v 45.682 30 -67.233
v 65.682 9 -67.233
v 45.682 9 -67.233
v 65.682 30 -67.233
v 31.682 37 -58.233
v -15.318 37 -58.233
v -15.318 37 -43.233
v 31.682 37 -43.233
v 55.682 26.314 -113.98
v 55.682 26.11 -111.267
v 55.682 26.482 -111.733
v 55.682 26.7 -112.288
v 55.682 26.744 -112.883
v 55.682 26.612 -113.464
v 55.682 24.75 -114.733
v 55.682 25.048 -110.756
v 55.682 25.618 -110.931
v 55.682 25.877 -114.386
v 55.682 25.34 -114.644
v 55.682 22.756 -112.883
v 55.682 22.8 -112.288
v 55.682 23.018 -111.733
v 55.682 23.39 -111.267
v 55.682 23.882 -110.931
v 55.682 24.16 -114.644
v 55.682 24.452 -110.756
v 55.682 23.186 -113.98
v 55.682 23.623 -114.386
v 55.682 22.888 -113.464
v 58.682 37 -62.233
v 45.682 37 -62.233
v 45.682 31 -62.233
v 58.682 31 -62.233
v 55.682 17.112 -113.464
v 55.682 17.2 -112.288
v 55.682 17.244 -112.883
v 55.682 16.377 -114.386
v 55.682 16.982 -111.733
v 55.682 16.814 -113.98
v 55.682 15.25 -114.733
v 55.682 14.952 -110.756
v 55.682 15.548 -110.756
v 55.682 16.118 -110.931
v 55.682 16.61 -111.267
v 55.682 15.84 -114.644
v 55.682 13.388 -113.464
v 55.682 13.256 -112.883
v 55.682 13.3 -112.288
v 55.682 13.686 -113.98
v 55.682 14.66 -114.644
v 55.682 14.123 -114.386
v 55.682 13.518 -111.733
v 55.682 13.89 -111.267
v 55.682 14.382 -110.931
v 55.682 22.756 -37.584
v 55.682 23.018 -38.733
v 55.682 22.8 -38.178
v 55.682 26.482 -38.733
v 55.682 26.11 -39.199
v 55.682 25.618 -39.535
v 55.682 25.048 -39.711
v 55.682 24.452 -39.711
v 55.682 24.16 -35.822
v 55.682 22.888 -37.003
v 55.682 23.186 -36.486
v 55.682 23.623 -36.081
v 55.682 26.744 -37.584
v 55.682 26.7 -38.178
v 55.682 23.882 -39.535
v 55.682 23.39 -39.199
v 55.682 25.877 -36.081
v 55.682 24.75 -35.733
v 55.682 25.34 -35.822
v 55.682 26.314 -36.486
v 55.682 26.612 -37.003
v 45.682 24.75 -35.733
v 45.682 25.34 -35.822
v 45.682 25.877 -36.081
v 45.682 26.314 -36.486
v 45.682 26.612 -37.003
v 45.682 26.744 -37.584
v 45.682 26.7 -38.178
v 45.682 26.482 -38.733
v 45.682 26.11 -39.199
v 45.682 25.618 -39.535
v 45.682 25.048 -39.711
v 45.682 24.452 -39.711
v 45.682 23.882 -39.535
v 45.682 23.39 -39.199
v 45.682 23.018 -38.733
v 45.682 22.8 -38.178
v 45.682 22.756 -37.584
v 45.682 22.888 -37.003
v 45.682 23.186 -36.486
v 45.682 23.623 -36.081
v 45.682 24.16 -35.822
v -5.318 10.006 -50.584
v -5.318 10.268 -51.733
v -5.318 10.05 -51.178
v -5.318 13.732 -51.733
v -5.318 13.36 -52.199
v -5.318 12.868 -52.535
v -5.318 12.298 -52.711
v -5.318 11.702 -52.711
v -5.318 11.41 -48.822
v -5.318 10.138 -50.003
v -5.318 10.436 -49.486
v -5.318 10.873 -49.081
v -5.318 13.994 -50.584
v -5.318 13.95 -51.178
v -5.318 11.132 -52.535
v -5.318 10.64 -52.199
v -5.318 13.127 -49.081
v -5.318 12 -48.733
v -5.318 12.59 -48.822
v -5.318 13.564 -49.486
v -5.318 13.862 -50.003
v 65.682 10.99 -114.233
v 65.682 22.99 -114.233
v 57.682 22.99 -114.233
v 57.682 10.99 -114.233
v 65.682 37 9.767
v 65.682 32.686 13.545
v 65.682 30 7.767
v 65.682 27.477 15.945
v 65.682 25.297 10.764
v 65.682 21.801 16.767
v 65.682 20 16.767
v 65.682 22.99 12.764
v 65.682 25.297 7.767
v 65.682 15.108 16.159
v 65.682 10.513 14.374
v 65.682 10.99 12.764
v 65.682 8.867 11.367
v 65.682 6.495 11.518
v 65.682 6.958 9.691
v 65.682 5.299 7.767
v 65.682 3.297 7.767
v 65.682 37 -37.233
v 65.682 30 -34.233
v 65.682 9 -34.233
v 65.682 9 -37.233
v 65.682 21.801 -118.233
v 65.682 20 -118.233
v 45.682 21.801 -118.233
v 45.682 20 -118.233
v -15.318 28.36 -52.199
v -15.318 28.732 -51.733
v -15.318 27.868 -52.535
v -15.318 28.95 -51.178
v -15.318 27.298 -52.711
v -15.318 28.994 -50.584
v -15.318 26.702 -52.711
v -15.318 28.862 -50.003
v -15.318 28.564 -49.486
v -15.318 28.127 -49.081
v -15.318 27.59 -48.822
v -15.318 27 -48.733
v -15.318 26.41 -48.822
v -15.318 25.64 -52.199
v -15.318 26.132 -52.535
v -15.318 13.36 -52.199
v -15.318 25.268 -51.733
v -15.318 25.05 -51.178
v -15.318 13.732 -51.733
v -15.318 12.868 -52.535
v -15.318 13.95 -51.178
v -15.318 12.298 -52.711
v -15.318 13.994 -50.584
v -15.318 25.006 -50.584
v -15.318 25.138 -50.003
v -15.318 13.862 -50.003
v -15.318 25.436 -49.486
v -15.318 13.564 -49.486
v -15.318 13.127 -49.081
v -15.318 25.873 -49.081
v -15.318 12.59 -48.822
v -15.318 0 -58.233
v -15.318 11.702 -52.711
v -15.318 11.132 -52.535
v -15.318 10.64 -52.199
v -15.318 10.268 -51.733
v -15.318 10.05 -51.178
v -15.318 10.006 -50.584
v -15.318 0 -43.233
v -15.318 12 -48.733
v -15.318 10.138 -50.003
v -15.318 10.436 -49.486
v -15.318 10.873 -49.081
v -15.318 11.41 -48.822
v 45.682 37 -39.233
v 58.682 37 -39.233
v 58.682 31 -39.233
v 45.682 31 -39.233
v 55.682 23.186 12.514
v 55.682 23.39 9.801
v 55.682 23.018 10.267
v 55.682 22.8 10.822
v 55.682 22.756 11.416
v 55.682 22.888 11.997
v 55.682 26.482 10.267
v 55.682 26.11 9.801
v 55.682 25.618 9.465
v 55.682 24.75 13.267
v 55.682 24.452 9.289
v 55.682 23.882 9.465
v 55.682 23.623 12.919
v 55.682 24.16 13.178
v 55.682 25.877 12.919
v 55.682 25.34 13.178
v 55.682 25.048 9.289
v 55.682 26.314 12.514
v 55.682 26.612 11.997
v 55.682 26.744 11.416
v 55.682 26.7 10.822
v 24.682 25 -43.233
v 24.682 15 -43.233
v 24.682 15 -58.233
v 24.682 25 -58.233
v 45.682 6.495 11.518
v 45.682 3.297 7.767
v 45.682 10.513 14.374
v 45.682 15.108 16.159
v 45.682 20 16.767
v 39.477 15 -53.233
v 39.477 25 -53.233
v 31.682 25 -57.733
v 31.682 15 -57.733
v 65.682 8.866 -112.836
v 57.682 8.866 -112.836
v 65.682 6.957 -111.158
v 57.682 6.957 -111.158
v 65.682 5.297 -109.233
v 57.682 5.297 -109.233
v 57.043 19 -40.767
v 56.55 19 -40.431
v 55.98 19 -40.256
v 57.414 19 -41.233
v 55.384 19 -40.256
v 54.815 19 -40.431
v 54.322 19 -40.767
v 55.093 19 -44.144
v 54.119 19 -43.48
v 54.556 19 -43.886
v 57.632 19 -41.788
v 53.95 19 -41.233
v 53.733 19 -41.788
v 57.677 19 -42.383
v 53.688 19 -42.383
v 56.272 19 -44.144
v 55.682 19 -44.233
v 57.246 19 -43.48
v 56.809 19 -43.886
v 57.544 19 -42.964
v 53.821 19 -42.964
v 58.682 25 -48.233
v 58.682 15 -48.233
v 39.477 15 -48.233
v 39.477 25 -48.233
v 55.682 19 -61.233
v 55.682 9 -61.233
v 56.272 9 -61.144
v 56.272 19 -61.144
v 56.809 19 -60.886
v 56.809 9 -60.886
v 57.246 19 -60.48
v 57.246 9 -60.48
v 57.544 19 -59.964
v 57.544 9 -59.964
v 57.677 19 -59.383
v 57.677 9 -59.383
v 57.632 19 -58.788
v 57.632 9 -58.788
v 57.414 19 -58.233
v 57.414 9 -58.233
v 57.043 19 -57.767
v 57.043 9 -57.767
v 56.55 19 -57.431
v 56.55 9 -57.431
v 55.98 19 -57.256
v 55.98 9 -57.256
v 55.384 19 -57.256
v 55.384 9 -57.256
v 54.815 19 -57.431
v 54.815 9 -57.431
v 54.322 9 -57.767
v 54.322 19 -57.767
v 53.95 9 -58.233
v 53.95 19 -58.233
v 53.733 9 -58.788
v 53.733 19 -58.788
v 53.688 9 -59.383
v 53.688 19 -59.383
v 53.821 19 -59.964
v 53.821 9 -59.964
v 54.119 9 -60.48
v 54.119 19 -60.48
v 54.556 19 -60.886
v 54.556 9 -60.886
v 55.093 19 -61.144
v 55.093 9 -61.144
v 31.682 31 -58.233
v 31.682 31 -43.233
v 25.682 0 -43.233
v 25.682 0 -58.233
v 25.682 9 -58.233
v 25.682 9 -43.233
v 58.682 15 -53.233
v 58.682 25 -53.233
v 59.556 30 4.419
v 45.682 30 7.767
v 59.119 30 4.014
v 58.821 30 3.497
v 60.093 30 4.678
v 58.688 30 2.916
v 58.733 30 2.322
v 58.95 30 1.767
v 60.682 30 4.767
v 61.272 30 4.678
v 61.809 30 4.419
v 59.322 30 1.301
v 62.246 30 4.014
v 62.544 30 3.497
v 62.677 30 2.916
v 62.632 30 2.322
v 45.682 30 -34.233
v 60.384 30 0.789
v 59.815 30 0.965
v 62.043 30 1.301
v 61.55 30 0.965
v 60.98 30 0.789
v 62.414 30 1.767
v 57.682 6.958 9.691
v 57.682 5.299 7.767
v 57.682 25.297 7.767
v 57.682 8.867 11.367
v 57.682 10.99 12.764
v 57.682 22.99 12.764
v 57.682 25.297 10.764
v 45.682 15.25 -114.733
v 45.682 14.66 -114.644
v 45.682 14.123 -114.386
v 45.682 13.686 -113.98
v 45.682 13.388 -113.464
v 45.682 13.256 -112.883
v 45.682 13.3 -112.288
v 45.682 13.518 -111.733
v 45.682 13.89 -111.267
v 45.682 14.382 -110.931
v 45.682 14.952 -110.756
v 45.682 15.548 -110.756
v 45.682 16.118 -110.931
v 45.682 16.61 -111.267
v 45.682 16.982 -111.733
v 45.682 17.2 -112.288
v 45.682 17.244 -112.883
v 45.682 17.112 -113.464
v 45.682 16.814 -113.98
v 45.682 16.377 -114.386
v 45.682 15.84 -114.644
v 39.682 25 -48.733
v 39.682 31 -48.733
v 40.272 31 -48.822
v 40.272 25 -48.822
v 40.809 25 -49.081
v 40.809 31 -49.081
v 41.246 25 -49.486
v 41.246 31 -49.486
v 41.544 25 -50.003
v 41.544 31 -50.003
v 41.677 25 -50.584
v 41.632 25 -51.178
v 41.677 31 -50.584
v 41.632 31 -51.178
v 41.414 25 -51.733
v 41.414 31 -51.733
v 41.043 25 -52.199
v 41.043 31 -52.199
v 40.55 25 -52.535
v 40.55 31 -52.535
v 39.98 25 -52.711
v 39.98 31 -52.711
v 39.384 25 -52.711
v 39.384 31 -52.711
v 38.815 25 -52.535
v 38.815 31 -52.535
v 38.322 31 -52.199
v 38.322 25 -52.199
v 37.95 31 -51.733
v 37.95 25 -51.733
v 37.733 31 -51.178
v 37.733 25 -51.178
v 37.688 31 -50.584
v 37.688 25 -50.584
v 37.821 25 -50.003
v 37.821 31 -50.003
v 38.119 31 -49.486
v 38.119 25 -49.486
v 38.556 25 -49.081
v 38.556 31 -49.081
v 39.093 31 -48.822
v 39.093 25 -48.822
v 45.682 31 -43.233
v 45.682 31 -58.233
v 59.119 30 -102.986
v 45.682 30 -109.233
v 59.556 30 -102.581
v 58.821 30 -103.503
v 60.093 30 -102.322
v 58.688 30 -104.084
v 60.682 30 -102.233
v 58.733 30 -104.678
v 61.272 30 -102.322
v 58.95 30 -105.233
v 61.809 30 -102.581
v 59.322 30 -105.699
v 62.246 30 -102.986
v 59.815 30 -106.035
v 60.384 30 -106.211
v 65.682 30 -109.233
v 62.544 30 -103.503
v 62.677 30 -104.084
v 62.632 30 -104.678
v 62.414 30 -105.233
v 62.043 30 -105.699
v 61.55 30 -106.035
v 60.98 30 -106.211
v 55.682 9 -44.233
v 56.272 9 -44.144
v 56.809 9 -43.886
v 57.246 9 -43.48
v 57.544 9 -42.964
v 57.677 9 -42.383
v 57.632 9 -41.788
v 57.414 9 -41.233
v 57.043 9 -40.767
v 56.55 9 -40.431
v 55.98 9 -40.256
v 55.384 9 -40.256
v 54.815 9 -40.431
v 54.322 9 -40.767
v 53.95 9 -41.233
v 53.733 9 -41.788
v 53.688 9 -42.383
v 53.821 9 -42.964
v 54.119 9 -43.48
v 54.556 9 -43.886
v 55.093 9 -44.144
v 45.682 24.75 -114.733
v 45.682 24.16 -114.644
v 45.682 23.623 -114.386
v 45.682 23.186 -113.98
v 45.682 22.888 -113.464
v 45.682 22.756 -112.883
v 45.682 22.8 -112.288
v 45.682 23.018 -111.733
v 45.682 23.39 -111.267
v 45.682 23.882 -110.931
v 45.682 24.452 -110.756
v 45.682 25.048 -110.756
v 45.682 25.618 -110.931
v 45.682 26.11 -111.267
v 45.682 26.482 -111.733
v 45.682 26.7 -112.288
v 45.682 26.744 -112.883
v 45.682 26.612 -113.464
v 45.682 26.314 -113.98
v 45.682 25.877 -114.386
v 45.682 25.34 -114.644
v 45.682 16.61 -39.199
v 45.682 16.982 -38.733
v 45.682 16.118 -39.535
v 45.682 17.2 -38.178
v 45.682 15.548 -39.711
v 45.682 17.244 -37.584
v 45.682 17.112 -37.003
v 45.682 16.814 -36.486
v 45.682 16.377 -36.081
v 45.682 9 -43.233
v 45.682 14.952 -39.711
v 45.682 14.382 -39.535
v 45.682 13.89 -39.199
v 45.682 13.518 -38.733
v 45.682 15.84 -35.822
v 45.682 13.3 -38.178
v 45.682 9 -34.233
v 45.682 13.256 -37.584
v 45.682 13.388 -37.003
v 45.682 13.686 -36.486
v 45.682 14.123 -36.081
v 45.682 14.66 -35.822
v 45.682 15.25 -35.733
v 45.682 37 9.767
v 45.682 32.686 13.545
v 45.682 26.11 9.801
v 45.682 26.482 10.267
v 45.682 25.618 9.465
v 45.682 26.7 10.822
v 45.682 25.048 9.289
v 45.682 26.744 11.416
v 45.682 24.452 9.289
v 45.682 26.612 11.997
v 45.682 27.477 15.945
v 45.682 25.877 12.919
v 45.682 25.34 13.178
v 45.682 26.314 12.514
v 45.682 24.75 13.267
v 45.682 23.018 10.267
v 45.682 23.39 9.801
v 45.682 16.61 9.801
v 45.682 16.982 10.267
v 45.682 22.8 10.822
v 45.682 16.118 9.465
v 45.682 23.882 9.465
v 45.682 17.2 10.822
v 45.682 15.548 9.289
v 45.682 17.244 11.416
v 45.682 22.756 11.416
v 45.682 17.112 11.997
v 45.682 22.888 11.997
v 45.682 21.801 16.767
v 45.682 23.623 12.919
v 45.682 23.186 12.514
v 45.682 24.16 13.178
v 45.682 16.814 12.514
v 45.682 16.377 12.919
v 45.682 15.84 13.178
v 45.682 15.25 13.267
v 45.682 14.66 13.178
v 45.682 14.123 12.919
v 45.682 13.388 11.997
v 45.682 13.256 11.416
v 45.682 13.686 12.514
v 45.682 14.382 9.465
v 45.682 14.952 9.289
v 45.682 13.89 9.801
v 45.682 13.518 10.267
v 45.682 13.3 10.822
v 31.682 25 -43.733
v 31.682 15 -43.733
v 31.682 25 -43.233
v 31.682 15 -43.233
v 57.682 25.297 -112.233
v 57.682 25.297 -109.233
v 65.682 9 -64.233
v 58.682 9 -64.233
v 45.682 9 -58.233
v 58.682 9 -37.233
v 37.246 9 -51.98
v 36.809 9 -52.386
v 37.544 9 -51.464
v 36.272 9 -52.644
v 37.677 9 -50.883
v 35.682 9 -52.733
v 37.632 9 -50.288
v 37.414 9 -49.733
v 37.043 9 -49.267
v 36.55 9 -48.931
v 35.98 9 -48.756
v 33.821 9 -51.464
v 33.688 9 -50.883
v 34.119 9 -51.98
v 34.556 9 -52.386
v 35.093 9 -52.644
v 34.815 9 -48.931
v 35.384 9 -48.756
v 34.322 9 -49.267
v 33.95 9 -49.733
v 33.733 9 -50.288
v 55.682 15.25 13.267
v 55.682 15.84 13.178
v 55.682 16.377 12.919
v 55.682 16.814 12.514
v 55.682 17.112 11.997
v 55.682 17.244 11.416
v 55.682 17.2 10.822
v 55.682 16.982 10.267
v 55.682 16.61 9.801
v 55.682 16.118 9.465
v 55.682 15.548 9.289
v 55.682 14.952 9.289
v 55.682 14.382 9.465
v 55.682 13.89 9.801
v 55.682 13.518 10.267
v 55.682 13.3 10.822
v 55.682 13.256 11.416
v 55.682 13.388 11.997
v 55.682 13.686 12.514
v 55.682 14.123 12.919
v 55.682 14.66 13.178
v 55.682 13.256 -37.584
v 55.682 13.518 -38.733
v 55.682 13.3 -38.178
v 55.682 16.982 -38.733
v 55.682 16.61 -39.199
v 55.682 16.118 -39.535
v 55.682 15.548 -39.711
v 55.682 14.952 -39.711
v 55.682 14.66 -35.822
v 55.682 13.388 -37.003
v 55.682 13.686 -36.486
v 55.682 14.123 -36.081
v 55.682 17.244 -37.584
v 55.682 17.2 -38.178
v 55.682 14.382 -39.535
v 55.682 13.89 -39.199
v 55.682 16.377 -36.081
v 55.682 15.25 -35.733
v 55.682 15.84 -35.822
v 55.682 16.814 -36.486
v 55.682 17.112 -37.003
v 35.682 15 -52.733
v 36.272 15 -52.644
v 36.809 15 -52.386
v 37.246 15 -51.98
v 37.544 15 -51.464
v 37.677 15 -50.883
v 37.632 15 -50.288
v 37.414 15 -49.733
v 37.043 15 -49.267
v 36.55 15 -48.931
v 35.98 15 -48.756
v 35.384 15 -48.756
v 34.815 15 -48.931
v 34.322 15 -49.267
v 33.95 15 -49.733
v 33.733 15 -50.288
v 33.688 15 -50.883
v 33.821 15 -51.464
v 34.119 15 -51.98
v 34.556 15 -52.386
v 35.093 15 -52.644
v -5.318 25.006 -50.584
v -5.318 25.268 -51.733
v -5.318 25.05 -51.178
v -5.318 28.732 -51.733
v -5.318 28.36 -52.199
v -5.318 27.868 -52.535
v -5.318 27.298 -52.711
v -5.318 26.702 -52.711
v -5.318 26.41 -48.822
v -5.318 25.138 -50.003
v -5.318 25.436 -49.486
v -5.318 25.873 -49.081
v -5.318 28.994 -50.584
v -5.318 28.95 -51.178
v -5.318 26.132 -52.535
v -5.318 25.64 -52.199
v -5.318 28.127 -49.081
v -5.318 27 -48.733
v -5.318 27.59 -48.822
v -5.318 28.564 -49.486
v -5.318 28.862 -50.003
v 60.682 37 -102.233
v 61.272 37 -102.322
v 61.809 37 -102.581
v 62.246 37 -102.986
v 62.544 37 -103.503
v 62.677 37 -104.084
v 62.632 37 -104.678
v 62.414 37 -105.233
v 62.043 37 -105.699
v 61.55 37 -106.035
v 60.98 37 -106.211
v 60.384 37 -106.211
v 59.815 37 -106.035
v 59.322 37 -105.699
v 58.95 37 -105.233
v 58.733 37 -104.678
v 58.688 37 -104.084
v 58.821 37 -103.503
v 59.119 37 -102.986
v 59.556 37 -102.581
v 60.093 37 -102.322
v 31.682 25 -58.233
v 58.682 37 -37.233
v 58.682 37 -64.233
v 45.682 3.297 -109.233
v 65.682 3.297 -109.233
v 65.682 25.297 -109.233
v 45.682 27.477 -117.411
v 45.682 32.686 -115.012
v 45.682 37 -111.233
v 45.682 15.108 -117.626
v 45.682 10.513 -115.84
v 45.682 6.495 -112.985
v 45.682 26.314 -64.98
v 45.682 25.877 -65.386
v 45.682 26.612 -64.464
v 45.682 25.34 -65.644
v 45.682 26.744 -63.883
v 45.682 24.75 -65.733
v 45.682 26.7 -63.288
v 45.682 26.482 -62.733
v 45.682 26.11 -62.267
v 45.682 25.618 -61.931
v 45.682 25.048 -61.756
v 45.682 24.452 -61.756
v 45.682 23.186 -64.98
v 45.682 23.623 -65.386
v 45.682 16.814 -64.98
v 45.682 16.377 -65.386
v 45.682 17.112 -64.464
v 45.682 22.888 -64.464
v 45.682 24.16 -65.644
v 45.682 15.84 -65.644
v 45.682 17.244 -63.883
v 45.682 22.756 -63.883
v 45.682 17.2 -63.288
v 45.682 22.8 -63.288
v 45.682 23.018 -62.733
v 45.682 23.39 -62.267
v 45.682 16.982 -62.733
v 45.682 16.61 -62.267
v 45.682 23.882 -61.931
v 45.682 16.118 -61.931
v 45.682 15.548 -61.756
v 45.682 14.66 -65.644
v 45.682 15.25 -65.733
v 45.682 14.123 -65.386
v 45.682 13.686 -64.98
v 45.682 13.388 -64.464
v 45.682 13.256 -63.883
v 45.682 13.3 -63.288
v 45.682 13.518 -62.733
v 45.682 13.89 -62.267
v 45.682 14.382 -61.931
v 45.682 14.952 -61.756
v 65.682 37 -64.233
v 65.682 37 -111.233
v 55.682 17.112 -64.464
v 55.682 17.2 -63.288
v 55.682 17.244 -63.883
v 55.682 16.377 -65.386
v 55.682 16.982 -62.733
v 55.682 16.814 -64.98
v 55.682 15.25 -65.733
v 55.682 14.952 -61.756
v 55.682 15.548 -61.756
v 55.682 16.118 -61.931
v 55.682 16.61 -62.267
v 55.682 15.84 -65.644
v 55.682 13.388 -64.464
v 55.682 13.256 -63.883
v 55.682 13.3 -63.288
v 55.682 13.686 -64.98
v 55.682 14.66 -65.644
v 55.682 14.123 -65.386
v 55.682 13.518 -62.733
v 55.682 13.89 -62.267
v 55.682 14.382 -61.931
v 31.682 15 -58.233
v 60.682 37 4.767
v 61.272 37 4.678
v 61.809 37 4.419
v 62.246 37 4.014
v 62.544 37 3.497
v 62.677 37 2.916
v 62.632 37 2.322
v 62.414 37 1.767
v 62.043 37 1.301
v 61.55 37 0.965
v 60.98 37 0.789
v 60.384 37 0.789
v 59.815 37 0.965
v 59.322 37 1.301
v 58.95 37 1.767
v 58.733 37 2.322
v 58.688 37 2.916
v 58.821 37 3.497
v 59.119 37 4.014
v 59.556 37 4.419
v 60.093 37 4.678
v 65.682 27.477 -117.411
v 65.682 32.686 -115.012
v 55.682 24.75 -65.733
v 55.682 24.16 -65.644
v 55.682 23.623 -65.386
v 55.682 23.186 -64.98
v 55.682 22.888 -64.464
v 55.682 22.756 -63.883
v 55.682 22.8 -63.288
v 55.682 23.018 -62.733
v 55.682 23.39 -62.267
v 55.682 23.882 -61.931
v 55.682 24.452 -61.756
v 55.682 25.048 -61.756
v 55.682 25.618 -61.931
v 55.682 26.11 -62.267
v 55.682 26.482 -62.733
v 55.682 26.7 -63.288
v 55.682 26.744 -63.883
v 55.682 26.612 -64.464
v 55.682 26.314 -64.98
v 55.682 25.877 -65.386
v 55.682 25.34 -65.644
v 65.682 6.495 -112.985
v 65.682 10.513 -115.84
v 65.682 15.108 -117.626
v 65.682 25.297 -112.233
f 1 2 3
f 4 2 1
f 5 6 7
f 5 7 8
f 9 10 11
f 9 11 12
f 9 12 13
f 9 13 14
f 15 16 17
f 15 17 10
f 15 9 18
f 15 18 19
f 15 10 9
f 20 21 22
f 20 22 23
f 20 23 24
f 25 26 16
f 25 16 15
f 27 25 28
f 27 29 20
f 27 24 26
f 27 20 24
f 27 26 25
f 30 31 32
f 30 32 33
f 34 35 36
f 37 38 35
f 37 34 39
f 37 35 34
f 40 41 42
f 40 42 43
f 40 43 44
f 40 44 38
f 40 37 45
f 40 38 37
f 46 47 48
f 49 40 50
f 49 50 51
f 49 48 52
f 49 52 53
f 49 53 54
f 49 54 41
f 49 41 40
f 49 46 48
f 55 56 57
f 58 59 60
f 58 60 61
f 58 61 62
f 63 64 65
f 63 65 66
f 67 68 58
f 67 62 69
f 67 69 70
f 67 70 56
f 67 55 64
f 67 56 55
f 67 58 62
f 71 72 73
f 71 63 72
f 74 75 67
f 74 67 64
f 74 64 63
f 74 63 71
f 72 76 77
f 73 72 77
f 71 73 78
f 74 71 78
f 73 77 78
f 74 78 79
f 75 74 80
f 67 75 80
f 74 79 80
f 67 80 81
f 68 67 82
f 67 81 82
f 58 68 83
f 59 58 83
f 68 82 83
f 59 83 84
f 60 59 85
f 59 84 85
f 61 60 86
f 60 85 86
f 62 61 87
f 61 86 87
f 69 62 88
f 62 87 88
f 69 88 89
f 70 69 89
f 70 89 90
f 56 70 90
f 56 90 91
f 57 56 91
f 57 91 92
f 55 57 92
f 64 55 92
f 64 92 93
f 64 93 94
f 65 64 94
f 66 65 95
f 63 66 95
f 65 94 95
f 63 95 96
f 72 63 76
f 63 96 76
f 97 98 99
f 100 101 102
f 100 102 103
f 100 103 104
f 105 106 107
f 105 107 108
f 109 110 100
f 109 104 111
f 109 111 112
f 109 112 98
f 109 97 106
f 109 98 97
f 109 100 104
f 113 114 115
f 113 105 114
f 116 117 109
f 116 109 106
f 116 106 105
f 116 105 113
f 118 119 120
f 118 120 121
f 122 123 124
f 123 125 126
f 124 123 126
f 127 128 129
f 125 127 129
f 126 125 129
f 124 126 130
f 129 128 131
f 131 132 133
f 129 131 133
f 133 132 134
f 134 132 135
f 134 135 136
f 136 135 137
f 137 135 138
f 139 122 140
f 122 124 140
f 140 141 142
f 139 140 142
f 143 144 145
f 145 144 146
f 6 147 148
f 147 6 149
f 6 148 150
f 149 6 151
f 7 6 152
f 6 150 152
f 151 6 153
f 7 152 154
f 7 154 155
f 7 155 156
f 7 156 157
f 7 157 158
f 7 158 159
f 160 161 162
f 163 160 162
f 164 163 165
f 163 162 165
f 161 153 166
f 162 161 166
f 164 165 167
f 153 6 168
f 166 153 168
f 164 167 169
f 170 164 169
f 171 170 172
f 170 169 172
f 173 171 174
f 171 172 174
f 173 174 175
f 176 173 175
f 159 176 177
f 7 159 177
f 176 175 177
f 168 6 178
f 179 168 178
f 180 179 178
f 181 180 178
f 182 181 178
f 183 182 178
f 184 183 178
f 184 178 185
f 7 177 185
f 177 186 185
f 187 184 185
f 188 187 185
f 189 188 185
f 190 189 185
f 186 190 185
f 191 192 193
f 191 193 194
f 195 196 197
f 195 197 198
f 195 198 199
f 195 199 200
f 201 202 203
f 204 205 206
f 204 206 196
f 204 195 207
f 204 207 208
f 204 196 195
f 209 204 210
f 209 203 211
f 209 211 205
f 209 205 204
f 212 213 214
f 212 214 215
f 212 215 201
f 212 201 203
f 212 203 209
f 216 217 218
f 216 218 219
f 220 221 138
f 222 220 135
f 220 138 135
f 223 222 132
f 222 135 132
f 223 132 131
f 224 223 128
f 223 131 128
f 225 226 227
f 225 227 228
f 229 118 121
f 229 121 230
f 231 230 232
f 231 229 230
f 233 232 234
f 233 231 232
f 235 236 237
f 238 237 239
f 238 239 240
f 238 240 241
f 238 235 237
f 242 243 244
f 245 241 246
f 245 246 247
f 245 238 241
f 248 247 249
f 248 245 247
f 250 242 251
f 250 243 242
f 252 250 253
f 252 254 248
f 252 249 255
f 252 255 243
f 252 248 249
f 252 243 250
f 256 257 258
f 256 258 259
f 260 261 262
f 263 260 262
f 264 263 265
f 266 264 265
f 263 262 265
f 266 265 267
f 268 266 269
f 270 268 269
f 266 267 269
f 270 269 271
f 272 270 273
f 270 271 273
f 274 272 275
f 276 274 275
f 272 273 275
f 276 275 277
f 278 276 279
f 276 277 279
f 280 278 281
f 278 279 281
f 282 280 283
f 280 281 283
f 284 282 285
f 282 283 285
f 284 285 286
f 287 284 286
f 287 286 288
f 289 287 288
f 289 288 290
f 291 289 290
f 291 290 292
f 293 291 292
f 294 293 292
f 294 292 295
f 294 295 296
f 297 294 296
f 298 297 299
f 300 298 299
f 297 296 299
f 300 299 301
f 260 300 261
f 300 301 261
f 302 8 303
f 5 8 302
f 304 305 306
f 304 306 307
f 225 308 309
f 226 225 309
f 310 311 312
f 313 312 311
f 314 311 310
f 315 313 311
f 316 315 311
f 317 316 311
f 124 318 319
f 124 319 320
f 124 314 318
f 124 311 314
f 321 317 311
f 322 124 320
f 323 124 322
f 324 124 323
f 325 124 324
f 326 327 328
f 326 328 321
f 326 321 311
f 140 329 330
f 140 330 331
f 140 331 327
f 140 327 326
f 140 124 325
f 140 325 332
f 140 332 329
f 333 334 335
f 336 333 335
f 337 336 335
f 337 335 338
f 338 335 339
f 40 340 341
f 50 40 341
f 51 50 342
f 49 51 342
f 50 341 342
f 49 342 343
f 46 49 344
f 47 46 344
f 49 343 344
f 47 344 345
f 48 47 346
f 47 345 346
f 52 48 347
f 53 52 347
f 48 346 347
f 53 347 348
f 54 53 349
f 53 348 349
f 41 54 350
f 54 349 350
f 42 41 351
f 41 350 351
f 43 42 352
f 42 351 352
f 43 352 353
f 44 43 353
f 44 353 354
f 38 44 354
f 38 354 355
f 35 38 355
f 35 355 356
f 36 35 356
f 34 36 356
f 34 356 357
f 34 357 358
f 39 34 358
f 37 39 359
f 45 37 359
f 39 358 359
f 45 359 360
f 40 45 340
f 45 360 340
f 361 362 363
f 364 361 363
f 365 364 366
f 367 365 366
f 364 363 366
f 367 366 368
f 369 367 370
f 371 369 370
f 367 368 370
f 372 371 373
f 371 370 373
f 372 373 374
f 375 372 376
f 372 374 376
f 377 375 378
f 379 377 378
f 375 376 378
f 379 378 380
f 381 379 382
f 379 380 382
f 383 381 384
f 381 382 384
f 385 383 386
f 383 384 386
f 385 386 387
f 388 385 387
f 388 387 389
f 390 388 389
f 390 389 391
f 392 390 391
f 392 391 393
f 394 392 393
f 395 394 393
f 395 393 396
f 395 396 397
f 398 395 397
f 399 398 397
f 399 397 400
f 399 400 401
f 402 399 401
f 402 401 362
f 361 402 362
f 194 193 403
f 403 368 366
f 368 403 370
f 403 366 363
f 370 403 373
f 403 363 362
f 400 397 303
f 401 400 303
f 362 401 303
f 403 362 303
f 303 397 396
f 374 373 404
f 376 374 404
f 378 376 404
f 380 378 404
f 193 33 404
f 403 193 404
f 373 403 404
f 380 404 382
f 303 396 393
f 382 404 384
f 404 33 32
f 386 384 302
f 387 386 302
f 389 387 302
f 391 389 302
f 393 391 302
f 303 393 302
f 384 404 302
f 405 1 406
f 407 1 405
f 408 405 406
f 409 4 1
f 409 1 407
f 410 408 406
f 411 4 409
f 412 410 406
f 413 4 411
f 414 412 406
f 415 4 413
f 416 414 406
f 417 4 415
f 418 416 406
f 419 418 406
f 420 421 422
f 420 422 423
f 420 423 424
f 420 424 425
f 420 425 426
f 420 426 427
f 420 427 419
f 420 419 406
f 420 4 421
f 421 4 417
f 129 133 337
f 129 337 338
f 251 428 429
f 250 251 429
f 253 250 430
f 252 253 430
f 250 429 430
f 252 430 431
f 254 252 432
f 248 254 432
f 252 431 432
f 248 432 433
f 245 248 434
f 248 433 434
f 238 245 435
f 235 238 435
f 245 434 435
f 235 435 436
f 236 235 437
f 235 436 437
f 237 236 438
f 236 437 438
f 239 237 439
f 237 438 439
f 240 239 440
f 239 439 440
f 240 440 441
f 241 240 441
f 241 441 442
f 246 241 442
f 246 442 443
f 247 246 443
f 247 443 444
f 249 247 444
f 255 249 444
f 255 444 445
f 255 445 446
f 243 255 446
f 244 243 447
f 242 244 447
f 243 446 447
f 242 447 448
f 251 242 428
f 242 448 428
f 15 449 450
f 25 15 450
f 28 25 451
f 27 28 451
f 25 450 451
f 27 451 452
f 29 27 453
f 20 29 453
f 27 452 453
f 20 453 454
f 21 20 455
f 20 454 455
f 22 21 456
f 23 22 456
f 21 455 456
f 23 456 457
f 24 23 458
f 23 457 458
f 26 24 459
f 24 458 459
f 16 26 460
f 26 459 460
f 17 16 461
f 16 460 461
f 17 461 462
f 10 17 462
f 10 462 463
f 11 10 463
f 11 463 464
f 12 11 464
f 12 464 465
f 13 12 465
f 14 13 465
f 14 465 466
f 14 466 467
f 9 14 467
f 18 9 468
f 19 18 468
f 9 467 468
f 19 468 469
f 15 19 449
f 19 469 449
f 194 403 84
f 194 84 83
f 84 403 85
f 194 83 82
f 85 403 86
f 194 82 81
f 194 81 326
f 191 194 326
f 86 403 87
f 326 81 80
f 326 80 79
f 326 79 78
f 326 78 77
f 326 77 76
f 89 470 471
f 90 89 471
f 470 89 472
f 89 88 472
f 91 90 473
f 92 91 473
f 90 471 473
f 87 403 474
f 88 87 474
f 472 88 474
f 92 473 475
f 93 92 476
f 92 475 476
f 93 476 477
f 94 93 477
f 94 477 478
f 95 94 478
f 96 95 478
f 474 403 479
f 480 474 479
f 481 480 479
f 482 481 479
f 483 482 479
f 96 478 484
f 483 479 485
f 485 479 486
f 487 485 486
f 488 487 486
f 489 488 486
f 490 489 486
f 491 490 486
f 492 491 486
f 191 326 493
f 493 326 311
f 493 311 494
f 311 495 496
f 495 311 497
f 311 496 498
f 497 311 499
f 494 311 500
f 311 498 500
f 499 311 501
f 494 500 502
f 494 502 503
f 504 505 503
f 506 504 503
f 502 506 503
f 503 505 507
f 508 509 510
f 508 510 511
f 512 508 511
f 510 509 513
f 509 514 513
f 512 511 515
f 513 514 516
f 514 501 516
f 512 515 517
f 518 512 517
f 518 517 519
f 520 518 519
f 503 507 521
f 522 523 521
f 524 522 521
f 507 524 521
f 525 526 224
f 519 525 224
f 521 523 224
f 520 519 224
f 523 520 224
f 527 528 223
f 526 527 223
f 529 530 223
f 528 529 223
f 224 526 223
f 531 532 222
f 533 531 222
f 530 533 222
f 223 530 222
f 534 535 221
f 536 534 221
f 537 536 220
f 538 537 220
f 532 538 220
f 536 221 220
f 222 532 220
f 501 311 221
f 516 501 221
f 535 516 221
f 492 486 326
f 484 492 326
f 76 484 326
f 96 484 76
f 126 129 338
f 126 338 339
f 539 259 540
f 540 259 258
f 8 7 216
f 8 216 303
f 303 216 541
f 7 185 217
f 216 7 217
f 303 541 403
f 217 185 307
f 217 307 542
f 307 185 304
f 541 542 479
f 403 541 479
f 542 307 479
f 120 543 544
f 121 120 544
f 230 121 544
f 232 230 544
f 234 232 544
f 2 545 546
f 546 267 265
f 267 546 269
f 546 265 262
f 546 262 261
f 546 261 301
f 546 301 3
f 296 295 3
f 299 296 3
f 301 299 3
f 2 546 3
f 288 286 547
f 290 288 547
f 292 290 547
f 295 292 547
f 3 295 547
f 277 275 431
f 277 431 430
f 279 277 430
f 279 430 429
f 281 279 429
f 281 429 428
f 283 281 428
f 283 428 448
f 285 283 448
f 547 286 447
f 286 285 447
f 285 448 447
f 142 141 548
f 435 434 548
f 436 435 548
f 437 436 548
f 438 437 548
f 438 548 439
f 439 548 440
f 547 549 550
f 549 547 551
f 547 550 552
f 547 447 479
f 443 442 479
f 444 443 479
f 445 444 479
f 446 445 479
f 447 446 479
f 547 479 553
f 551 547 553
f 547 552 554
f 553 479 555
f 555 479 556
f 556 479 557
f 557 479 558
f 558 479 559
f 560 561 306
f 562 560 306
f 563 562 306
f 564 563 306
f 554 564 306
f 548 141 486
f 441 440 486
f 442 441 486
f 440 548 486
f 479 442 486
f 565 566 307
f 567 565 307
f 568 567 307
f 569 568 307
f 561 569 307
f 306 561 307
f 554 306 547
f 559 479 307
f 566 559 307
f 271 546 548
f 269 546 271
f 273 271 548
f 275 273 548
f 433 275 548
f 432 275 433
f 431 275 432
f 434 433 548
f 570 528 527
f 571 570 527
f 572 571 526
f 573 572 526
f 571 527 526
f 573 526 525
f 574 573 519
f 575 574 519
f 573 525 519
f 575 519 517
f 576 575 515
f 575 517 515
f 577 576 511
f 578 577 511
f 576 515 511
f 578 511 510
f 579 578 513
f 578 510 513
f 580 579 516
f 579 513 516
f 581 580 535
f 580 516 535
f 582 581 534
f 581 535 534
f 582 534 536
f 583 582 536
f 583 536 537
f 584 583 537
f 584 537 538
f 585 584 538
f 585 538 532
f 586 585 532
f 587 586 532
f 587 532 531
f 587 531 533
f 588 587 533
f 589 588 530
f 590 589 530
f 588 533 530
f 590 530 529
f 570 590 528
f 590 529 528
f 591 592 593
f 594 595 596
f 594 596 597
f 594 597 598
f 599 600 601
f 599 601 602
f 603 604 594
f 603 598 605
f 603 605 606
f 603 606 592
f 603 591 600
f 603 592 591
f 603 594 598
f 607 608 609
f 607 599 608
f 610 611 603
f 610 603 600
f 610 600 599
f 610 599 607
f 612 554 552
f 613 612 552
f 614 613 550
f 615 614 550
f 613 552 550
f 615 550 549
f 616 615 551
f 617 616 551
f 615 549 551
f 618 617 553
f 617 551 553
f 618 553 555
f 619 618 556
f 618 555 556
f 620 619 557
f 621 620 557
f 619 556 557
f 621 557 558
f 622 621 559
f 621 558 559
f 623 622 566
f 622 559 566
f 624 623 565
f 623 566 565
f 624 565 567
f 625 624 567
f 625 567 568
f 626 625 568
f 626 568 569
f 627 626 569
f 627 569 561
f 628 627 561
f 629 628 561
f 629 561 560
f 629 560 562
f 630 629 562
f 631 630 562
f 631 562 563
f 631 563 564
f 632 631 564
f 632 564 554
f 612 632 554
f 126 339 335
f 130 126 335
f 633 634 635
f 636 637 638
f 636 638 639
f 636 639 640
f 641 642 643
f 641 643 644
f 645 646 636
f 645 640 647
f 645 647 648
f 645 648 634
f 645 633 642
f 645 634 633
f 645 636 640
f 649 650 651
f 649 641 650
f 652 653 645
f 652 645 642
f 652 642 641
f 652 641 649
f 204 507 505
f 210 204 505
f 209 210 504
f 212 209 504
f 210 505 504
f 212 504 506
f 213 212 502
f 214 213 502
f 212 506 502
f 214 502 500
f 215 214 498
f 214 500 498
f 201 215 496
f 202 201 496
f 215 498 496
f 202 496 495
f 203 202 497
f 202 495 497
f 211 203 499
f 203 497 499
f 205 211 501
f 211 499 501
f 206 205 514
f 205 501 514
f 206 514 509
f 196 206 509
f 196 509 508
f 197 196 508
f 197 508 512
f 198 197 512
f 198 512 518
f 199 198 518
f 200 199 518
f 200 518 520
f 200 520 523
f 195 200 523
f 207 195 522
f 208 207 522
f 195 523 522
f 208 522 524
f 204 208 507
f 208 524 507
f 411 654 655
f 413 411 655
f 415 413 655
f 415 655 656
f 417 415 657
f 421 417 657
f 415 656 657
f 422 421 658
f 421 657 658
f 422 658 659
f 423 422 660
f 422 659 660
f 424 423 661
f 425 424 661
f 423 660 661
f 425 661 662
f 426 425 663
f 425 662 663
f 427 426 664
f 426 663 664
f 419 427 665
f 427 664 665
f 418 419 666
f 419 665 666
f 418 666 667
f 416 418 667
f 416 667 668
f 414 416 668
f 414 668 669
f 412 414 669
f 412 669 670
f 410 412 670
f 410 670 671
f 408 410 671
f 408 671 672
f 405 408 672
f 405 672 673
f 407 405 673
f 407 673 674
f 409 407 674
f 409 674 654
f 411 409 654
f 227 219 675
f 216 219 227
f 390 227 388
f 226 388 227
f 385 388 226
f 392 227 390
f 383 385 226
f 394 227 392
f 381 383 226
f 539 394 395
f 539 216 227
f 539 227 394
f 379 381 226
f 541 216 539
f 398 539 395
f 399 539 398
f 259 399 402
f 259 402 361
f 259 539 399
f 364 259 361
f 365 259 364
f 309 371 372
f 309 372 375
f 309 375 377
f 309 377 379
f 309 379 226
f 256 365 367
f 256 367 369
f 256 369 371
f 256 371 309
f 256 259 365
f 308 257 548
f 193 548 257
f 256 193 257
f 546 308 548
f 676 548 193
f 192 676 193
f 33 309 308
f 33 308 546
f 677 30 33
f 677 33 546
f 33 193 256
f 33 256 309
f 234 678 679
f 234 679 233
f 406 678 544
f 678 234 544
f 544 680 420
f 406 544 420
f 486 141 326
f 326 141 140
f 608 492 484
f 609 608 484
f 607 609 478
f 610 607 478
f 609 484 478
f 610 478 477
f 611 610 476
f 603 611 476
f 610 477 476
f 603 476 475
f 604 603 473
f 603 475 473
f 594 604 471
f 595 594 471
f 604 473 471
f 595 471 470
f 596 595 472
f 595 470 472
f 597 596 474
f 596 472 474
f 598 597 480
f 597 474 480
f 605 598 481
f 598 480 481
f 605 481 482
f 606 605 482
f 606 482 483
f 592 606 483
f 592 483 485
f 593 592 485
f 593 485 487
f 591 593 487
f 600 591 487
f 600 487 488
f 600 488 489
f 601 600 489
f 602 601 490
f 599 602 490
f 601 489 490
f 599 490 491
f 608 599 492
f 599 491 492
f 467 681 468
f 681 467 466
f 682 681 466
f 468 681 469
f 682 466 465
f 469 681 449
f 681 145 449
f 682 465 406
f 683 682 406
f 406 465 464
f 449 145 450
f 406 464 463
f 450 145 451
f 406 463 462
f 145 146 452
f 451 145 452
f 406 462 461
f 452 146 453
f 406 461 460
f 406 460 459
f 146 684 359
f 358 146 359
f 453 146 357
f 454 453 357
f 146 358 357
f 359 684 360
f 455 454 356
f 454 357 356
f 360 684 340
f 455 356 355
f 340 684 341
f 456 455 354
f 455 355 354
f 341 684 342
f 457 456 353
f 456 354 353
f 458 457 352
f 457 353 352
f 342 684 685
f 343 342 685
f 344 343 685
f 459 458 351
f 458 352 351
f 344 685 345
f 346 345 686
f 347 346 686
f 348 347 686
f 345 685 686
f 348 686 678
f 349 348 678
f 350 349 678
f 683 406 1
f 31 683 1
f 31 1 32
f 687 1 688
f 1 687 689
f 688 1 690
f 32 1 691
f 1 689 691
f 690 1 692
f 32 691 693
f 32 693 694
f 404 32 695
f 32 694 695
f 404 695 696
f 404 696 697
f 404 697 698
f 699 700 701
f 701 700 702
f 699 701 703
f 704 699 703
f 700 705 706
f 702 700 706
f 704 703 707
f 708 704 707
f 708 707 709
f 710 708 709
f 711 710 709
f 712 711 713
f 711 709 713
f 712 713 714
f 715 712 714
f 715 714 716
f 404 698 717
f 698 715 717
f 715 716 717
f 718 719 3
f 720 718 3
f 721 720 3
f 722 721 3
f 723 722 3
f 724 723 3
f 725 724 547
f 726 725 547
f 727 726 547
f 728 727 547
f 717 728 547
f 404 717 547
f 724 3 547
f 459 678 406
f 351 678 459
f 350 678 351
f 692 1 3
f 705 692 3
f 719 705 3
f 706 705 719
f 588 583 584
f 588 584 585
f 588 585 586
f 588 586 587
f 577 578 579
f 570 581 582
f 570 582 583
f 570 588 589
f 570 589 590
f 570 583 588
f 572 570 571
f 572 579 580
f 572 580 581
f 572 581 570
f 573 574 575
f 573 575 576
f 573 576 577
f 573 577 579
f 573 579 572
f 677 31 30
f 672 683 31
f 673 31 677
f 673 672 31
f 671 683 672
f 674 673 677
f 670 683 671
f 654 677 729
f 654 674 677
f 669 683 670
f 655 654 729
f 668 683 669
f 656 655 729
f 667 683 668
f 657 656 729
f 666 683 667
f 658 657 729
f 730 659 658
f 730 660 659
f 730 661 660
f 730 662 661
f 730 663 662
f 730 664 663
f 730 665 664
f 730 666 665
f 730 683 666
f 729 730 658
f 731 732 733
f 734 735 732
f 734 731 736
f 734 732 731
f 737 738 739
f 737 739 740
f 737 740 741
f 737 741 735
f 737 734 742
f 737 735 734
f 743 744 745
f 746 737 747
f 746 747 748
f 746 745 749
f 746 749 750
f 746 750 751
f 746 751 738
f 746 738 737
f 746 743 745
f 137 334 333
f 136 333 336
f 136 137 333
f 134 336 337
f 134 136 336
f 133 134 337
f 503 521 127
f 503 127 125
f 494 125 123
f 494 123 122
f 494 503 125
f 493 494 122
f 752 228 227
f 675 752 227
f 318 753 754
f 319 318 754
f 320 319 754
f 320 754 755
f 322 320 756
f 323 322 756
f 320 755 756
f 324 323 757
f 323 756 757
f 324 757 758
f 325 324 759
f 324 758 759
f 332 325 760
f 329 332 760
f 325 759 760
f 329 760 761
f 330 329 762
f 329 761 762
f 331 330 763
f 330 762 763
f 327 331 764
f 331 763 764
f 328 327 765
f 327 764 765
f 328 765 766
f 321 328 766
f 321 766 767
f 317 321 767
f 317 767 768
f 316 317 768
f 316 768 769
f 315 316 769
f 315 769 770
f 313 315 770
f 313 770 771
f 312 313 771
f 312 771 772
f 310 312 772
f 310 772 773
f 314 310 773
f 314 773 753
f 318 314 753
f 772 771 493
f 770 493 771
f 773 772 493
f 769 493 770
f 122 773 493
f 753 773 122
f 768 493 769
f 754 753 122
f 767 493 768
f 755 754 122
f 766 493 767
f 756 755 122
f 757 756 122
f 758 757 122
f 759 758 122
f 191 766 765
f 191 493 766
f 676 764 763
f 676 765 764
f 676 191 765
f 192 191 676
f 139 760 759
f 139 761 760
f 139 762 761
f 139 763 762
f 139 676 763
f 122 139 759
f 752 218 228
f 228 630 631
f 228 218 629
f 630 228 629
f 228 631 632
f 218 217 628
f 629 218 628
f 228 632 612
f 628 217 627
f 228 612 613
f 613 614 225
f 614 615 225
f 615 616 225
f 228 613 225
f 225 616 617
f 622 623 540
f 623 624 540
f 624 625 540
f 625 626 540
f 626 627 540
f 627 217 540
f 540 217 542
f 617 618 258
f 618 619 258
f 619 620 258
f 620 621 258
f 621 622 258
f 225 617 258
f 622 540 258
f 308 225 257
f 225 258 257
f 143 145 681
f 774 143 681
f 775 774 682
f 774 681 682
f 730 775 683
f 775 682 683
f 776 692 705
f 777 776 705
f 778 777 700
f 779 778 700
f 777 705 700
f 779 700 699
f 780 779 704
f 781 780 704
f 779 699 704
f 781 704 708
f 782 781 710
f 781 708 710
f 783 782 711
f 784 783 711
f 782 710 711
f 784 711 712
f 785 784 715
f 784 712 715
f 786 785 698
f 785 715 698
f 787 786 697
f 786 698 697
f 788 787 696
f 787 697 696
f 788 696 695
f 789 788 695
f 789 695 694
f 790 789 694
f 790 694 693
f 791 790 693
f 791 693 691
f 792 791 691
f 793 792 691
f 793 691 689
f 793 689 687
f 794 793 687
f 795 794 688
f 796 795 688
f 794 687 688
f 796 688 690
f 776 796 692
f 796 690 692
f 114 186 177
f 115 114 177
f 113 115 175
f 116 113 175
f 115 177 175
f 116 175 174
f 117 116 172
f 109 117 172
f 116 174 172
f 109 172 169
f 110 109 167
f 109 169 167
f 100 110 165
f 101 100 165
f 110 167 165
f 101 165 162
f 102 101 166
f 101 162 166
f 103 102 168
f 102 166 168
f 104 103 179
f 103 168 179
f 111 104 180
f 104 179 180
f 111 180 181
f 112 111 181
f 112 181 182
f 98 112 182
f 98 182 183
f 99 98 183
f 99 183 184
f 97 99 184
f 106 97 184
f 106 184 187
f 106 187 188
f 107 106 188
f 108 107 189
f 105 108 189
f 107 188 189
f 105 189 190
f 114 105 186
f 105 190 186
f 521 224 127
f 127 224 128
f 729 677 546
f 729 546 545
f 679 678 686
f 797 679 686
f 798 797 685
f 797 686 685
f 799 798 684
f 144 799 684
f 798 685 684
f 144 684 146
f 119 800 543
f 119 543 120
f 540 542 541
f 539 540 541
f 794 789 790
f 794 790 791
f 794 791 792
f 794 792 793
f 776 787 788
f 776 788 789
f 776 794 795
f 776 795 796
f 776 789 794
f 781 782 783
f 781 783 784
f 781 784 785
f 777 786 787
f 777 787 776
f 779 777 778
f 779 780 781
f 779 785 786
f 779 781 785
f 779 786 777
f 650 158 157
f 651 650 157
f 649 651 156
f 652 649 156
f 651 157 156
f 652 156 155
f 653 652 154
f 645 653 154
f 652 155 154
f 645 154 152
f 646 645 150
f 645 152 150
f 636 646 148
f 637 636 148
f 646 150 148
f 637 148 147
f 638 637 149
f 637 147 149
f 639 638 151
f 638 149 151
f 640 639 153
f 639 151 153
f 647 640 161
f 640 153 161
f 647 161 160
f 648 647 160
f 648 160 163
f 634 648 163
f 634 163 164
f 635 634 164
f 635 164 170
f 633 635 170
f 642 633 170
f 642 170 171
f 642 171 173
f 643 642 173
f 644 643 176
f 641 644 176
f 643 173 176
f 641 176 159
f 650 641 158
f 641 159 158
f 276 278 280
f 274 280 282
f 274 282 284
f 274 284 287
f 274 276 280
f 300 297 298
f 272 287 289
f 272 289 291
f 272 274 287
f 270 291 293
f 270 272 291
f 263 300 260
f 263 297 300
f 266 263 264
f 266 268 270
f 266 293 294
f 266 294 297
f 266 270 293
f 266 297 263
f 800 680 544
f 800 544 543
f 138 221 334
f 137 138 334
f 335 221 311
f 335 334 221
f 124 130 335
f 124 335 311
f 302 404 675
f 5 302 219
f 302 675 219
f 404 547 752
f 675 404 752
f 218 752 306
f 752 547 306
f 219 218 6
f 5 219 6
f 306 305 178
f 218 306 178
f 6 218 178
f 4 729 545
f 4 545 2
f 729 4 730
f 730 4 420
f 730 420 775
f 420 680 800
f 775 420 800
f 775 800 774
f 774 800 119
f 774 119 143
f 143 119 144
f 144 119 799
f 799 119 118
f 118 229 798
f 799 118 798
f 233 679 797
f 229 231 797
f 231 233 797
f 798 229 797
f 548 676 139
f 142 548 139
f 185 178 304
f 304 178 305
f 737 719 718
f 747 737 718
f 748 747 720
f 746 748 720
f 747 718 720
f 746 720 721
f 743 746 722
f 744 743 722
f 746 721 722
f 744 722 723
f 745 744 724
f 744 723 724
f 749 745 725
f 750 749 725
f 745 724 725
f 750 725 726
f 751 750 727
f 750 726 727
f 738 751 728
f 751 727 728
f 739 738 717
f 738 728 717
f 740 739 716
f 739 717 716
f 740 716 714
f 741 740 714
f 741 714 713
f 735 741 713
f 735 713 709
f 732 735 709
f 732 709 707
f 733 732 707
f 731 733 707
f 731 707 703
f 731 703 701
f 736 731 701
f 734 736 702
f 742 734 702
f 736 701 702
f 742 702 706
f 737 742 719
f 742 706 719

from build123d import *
from OCP.BRepFilletAPI import BRepFilletAPI_MakeChamfer

# Parameters (mm, degrees)
BOSS_EXTRUDE1_DEPTH = 37
CUT_EXTRUDE1_REACH  = 150.017
SKETCH2_W           = 42
SKETCH2_H           = 21
SKETCH3_R           = 2
CUT_EXTRUDE2_DEPTH  = 10
FILLET1_R           = 20
CUT_EXTRUDE5_REACH  = 150.017
SKETCH6_W           = 42
SKETCH6_H           = 9
SKETCH7_R           = 2
CUT_EXTRUDE6_DEPTH  = 10
CUT_EXTRUDE7_DEPTH  = 9
SKETCH9_R           = 2
CUT_EXTRUDE8_DEPTH  = 10
CUT_EXTRUDE9_DEPTH  = 6
SKETCH11_R          = 2
CUT_EXTRUDE10_DEPTH = 9
SKETCH12_R          = 2
CUT_EXTRUDE11_DEPTH = 10
CUT_EXTRUDE12_REACH = 140.091
CUT_EXTRUDE16_REACH = 142.222
SKETCH14_W          = 7
SKETCH14_H          = 27
CUT_EXTRUDE17_REACH = 108.34
SKETCH16_W          = 7
SKETCH16_H          = 10
CUT_EXTRUDE18_REACH = 146.306
SKETCH15_W          = 5
SKETCH15_H          = 10
CHAMFER1_SIZE       = 4.5
CHAMFER1_SIZE2      = 7.794228634
CUT_EXTRUDE19_DEPTH = 8


with BuildPart() as part:
    # Sketch1 → Boss-Extrude1 (new body)
    with BuildSketch(Plane(origin=(0, 0, 0), x_dir=(1, 0, 0), z_dir=(0, 1, 0))):
        Polygon((-15.317617866, 43.23325062), (45.682382134, 43.23325062), (45.682382134, -16.76674938), (65.682382134, -16.76674938), (65.682382134, 118.23325062), (45.682382134, 118.23325062), (45.682382134, 58.23325062), (-15.317617866, 58.23325062), align=None)
    extrude(amount=BOSS_EXTRUDE1_DEPTH)

    # Sketch2 → Cut-Extrude1 (cut, up to next)
    with BuildSketch(Plane(origin=(65.682382134, 0, 0), x_dir=(0, 0, -1), z_dir=(1, 0, 0)), mode=Mode.PRIVATE) as cut_extrude1_sk1:
        with Locations((13.23325062, 19.5)):
            Rectangle(SKETCH2_W, SKETCH2_H)
    cut_extrude1_tool1 = extrude(cut_extrude1_sk1.sketch, amount=-CUT_EXTRUDE1_REACH, mode=Mode.PRIVATE) & part.part
    # Sketch2 → Cut-Extrude1 (cut, up to next)
    with BuildSketch(Plane(origin=(65.682382134, 0, 0), x_dir=(0, 0, -1), z_dir=(1, 0, 0)), mode=Mode.PRIVATE) as cut_extrude1_sk2:
        with Locations((88.23325062, 19.5)):
            Rectangle(SKETCH2_W, SKETCH2_H)
    cut_extrude1_tool2 = extrude(cut_extrude1_sk2.sketch, amount=-CUT_EXTRUDE1_REACH, mode=Mode.PRIVATE) & part.part
    add(cut_extrude1_tool1.solids().sort_by_distance((65.682382, 19.5, -13.233251))[0], mode=Mode.SUBTRACT)
    add(cut_extrude1_tool2.solids().sort_by_distance((65.682382, 19.5, -88.233251))[0], mode=Mode.SUBTRACT)

    # Sketch3 → Cut-Extrude2 (cut)
    with BuildSketch(Plane.ZY.offset(-45.682382134)):
        with Locations((11.26674938, 24.75)):
            Circle(SKETCH3_R)
        with Locations((11.26674938, 15.25)):
            Circle(SKETCH3_R)
        with Locations((-37.73325062, 24.75)):
            Circle(SKETCH3_R)
        with Locations((-37.73325062, 15.25)):
            Circle(SKETCH3_R)
        with Locations(Location((-112.73325062, 24.75, 0), (0, 0, 180))):
            Circle(SKETCH3_R)
        with Locations(Location((-112.73325062, 15.25, 0), (0, 0, 180))):
            Circle(SKETCH3_R)
        with Locations(Location((-63.73325062, 15.25, 0), (0, 0, 180))):
            Circle(SKETCH3_R)
        with Locations(Location((-63.73325062, 24.75, 0), (0, 0, 180))):
            Circle(SKETCH3_R)
    extrude(amount=-CUT_EXTRUDE2_DEPTH, mode=Mode.SUBTRACT)

    # Fillet1
    fillet1_edges = [part.edges().sort_by_distance(p)[0] for p in [
        (55.682382134, 0, -118.23325062),
        (55.682382134, 0, 16.76674938),
    ]]
    fillet(fillet1_edges, radius=FILLET1_R)

    # Sketch6 → Cut-Extrude5 (cut, up to next)
    with BuildSketch(Plane(origin=(65.682382134, 0, 0), x_dir=(0, 0, -1), z_dir=(1, 0, 0)), mode=Mode.PRIVATE) as cut_extrude5_sk1:
        with Locations((13.23325062, 4.5)):
            Rectangle(SKETCH6_W, SKETCH6_H)
    cut_extrude5_tool1 = extrude(cut_extrude5_sk1.sketch, amount=-CUT_EXTRUDE5_REACH, mode=Mode.PRIVATE) & part.part
    # Sketch6 → Cut-Extrude5 (cut, up to next)
    with BuildSketch(Plane(origin=(65.682382134, 0, 0), x_dir=(0, 0, -1), z_dir=(1, 0, 0)), mode=Mode.PRIVATE) as cut_extrude5_sk2:
        with Locations((88.23325062, 4.5)):
            Rectangle(SKETCH6_W, SKETCH6_H)
    cut_extrude5_tool2 = extrude(cut_extrude5_sk2.sketch, amount=-CUT_EXTRUDE5_REACH, mode=Mode.PRIVATE) & part.part
    add(cut_extrude5_tool1.solids().sort_by_distance((65.682382, 4.5, -13.233251))[0], mode=Mode.SUBTRACT)
    add(cut_extrude5_tool2.solids().sort_by_distance((65.682382, 4.5, -88.233251))[0], mode=Mode.SUBTRACT)

    # Sketch7 → Cut-Extrude6 (cut)
    with BuildSketch(Plane.ZY.offset(15.317617866)):
        with Locations((-50.73325062, 27)):
            Circle(SKETCH7_R)
        with Locations((-50.73325062, 12)):
            Circle(SKETCH7_R)
    extrude(amount=-CUT_EXTRUDE6_DEPTH, mode=Mode.SUBTRACT)

    # Sketch8 → Cut-Extrude7 (cut)
    with BuildSketch(Plane.XZ):
        Polygon((45.682382134, -67.23325062), (45.682382134, -58.23325062), (25.682382134, -58.23325062), (25.682382134, -43.23325062), (45.682382134, -43.23325062), (45.682382134, -34.23325062), (65.682382134, -34.23325062), (65.682382134, -67.23325062), align=None)
    extrude(amount=-CUT_EXTRUDE7_DEPTH, mode=Mode.SUBTRACT)

    # Sketch9 → Cut-Extrude8 (cut)
    with BuildSketch(Plane.XZ.offset(-9)):
        with Locations(Location((55.682382134, -42.23325062, 0), (0, 0, 270))):
            Circle(SKETCH9_R)
        with Locations(Location((55.682382134, -59.23325062, 0), (0, 0, 270))):
            Circle(SKETCH9_R)
        with Locations(Location((35.682382134, -50.73325062, 0), (0, 0, 270))):
            Circle(SKETCH9_R)
    extrude(amount=-CUT_EXTRUDE8_DEPTH, mode=Mode.SUBTRACT)

    # Sketch10 → Cut-Extrude9 (cut)
    with BuildSketch(Plane(origin=(0, 37, 0), x_dir=(1, 0, 0), z_dir=(0, 1, 0))):
        Polygon((45.682382134, 62.23325062), (65.682382134, 62.23325062), (65.682382134, 39.23325062), (45.682382134, 39.23325062), (45.682382134, 43.23325062), (31.682382134, 43.23325062), (31.682382134, 58.23325062), (45.682382134, 58.23325062), align=None)
    extrude(amount=-CUT_EXTRUDE9_DEPTH, mode=Mode.SUBTRACT)

    # Sketch11 → Cut-Extrude10 (cut)
    with BuildSketch(Plane(origin=(0, 31, 0), x_dir=(1, 0, 0), z_dir=(0, 1, 0))):
        with Locations(Location((39.682382134, 50.73325062, 0), (0, 0, 270))):
            Circle(SKETCH11_R)
    extrude(amount=-CUT_EXTRUDE10_DEPTH, mode=Mode.SUBTRACT)

    # Sketch12 → Cut-Extrude11 (cut)
    with BuildSketch(Plane(origin=(0, 37, 0), x_dir=(1, 0, 0), z_dir=(0, 1, 0))):
        with Locations(Location((60.682382134, -2.76674938, 0), (0, 0, 270))):
            Circle(SKETCH12_R)
        with Locations(Location((60.682382134, 104.23325062, 0), (0, 0, 270))):
            Circle(SKETCH12_R)
    extrude(amount=-CUT_EXTRUDE11_DEPTH, mode=Mode.SUBTRACT)

    # Sketch13 → Cut-Extrude12 (cut, up to next)
    with BuildSketch(Plane.ZY.offset(-45.682382134), mode=Mode.PRIVATE) as cut_extrude12_sk1:
        with BuildLine():
            Line((-111.23325062, 37), (-118.23325062, 37))
            Line((-118.23325062, 37), (-118.23325062, 21.801315846))
            ThreePointArc((-118.23325062, 21.801315846), (-116.399152745, 30.167916112), (-111.23325062, 37))
        make_face()
    cut_extrude12_tool1 = extrude(cut_extrude12_sk1.sketch, amount=-CUT_EXTRUDE12_REACH, mode=Mode.PRIVATE) & part.part
    # Sketch13 → Cut-Extrude12 (cut, up to next)
    with BuildSketch(Plane.ZY.offset(-45.682382134), mode=Mode.PRIVATE) as cut_extrude12_sk2:
        with BuildLine():
            Line((9.76674938, 37), (16.76674938, 37))
            Line((16.76674938, 37), (16.76674938, 21.801315846))
            ThreePointArc((16.76674938, 21.801315846), (14.932651504, 30.167916112), (9.76674938, 37))
        make_face()
    cut_extrude12_tool2 = extrude(cut_extrude12_sk2.sketch, amount=-CUT_EXTRUDE12_REACH, mode=Mode.PRIVATE) & part.part
    add(cut_extrude12_tool1.solids().sort_by_distance((45.682382, 33.346132, -116.215792))[0], mode=Mode.SUBTRACT)
    add(cut_extrude12_tool2.solids().sort_by_distance((45.682382, 33.346132, 14.749291))[0], mode=Mode.SUBTRACT)

    # Sketch14 → Cut-Extrude16 (cut, up to next)
    with BuildSketch(Plane(origin=(0, 37, 0), x_dir=(1, 0, 0), z_dir=(0, 1, 0)), mode=Mode.PRIVATE) as cut_extrude16_sk1:
        with Locations((62.182382134, 50.73325062)):
            Rectangle(SKETCH14_W, SKETCH14_H)
    cut_extrude16_tool1 = extrude(cut_extrude16_sk1.sketch, amount=-CUT_EXTRUDE16_REACH, mode=Mode.PRIVATE) & part.part
    add(cut_extrude16_tool1.solids().sort_by_distance((62.182382, 37, -50.733251))[0], mode=Mode.SUBTRACT)

    # Sketch16 → Cut-Extrude17 (cut, up to next)
    with BuildSketch(Plane.XY.offset(-43.23325062), mode=Mode.PRIVATE) as cut_extrude17_sk1:
        with Locations((28.182382134, 20)):
            Rectangle(SKETCH16_W, SKETCH16_H)
    cut_extrude17_tool1 = extrude(cut_extrude17_sk1.sketch, amount=-CUT_EXTRUDE17_REACH, mode=Mode.PRIVATE) & part.part
    add(cut_extrude17_tool1.solids().sort_by_distance((28.182382, 20, -43.233251))[0], mode=Mode.SUBTRACT)

    # Sketch15 → Cut-Extrude18 (cut, up to next)
    with BuildSketch(Plane(origin=(58.682382134, 0, 0), x_dir=(0, 0, -1), z_dir=(1, 0, 0)), mode=Mode.PRIVATE) as cut_extrude18_sk1:
        with Locations((50.73325062, 20)):
            Rectangle(SKETCH15_W, SKETCH15_H)
    cut_extrude18_tool1 = extrude(cut_extrude18_sk1.sketch, amount=-CUT_EXTRUDE18_REACH, mode=Mode.PRIVATE) & part.part
    add(cut_extrude18_tool1.solids().sort_by_distance((58.682382, 20, -50.733251))[0], mode=Mode.SUBTRACT)

    # Chamfer1: one chamfer whose edges measure the first distance from different faces: ONE call of the kernel's chamfer builder (chamfer() names one face for all edges)
    chamfer1_edges_1 = [part.edges().sort_by_distance(p)[0] for p in [
        (31.682382134, 20, -53.23325062),
    ]]
    chamfer1_side_1 = [part.faces().sort_by_distance(p)[0] for p in [
        (31.682382134, 20, -55.73325062),
    ]]
    chamfer1_edges_2 = [part.edges().sort_by_distance(p)[0] for p in [
        (31.682382134, 20, -48.23325062),
    ]]
    chamfer1_side_2 = [part.faces().sort_by_distance(p)[0] for p in [
        (31.682382134, 20, -45.73325062),
    ]]
    chamfer1 = BRepFilletAPI_MakeChamfer(part.part.solid().wrapped)
    for e in chamfer1_edges_1:
        chamfer1.Add(CHAMFER1_SIZE, CHAMFER1_SIZE2, e.wrapped, chamfer1_side_1[0].wrapped)  # the first distance lies on this face
    for e in chamfer1_edges_2:
        chamfer1.Add(CHAMFER1_SIZE, CHAMFER1_SIZE2, e.wrapped, chamfer1_side_2[0].wrapped)  # the first distance lies on this face
    add(Compound.cast(chamfer1.Shape()), mode=Mode.REPLACE)

    # Sketch18 → Cut-Extrude19 (cut)
    with BuildSketch(Plane(origin=(65.682382134, 0, 0), x_dir=(0, 0, -1), z_dir=(1, 0, 0))):
        with BuildLine():
            Line((109.23325062, 25.296706912), (112.23325062, 25.296706912))
            Line((112.23325062, 25.296706912), (114.23325062, 22.989626664))
            Line((114.23325062, 22.989626664), (114.23325062, 10.989626664))
            ThreePointArc((114.23325062, 10.989626664), (112.030073944, 7.882471629), (109.23325062, 5.296706912))
            Line((109.23325062, 5.296706912), (109.23325062, 25.296706912))
        make_face()
        with BuildLine():
            Line((-7.763672274, 25.296706912), (-7.763672274, 5.296706912))
            ThreePointArc((-7.763672274, 5.296706912), (-10.560495598, 7.882471629), (-12.763672274, 10.989626664))
            Line((-12.763672274, 10.989626664), (-12.763672274, 22.989626664))
            Line((-12.763672274, 22.989626664), (-10.763672274, 25.296706912))
            Line((-10.763672274, 25.296706912), (-7.763672274, 25.296706912))
        make_face()
    extrude(amount=-CUT_EXTRUDE19_DEPTH, mode=Mode.SUBTRACT)


solid = part.part
